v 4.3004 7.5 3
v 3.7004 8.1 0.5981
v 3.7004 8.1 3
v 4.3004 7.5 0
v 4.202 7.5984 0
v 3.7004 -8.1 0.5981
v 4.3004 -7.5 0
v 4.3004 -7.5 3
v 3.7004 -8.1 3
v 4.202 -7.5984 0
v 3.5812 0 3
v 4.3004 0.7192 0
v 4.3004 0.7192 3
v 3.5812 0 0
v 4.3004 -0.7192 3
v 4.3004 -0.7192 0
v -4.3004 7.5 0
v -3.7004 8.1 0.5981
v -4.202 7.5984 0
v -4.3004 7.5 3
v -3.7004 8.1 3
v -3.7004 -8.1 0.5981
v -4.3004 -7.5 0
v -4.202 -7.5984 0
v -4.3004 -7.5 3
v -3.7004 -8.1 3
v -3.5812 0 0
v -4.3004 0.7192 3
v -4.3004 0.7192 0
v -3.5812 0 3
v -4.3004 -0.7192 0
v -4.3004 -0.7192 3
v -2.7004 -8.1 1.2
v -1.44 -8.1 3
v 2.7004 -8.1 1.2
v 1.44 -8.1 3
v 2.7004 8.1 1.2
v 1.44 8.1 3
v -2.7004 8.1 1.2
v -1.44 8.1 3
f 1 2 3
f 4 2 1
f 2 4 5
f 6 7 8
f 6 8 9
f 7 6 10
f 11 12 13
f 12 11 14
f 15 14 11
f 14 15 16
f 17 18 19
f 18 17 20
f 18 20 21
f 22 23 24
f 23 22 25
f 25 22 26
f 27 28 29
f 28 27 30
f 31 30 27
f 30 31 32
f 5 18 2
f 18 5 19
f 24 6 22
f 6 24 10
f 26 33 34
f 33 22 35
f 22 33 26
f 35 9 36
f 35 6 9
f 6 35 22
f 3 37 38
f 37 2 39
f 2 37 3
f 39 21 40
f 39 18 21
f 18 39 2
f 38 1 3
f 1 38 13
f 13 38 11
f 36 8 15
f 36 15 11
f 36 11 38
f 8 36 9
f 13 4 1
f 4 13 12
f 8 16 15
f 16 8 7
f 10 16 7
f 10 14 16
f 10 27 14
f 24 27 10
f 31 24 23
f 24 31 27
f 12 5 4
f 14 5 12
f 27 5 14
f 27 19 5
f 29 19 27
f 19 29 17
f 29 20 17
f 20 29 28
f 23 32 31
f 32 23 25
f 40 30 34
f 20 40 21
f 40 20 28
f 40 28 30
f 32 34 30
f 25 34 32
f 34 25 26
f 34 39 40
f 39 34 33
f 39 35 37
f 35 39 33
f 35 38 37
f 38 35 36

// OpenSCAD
// file: elephant.scad
// An ELEPHANT HEAD on the puzzle key's top face (`face = "elephant"` in
// puzzle-key.scad, 2026-10-28). Seen from above, like a watch face: the
// face's "up" runs along the band (+x), the trunk hangs towards -x, the big
// ears spread across the band (y), where the key is long.
//
// Everything stands on the key's top (z = `pz_thick`) and is a HEIGHT
// FIELD: half-ellipsoid domes, and the trunk a hull of domes. The key
// prints upright, legs on the bed, so the face is its top and nothing hangs.
// It is clipped to the key's own outline (`ek_outline_2d`), so it never
// reaches over the band's ends, the notches or the chamfered ends, and the
// key slides in as before.
//
// Frame: the key's, fastened — x along the band from the key's middle, y
// across it, z up from the bed. Needs lib/puzzle-key.scad included first.

// ----------------------------------------------------------------- head
ek_head   = [0.5, 0, 3.4, 4.0, 2.8];   // [x, y, rx, ry, height]
// ----------------------------------------------------------------- ears
ek_ear    = [-0.2, 4.4, 3.9, 3.0, 1.5];   // the +y ear; -y mirrored
ek_inner  = 0.5;     // the inner ear's dimple, as a share of the ear
ek_in_d   = 0.3;     // ... its depth below the ear's top
ek_in_dy  = 0.5;     //   and how far it sits out from the ear's middle
// ----------------------------------------------------------------- trunk
// The trunk's path, root to curled tip: [x, y, radius, rise above the
// head]. Where the head is lower than the rise, the trunk stands on the
// key's top on its own.
ek_trunk  = [[ 1.2,  0.0,  1.45, 0.7 ],
             [ 0.0,  0.0,  1.35, 0.7 ],
             [-1.3,  0.05, 1.2,  0.7 ],
             [-2.5,  0.3,  1.05, 0.75],
             [-3.2,  1.0,  0.95, 1.3 ],
             [-3.0,  1.9,  0.8,  1.15],
             [-2.3,  2.1,  0.65, 0.95]];
// ----------------------------------------------------------------- eyes
ek_eye    = [2.2, 1.8];     // [x, |y|] — dimples in the head
ek_eye_r  = 0.55;
ek_eye_d  = 0.45;           // how deep

// The head's height above the key's top at (x, y).
function ek_head_h(x, y) =
    let(u = (x - ek_head[0]) / ek_head[2], v = (y - ek_head[1]) / ek_head[3],
        q = 1 - u*u - v*v)
    q > 0 ? ek_head[4] * sqrt(q) : 0;

// A half-ellipsoid standing on z = 0: plan radii rx, ry, height h.
module ek_dome(rx, ry, h)
    scale([rx, ry, h]) intersection() {
        sphere(r = 1, $fn = 48);
        translate([-1, -1, 0]) cube(2);
    }

// The key's top outline: inside its faces, off the notches, the lead-ins and
// the chamfered ends, `ek_inset` in from each.
ek_inset = 0.15;
module ek_outline_2d()
    offset(delta = -ek_inset) difference() {
        square([2*pz_so, pz_len - 2*pz_tch[0]], center = true);
        for (m = [0, 1]) mirror([m, 0]) {
            translate([pz_so, 0])
                polygon([[0.01, -pz_nd - 0.01], [0.01, pz_nd + 0.01], [-pz_nd, 0]]);
            for (e = [-1, 1]) translate([pz_so, e * pz_len/2])
                polygon([[0.01, e*0.01], [0.01, -e*(pz_ch + 0.01)], [-pz_ch - 0.01, e*0.01]]);
        }
    }

module ek_ears()
    for (m = [0, 1]) mirror([0, m, 0]) difference() {
        translate([ek_ear[0], ek_ear[1], 0]) ek_dome(ek_ear[2], ek_ear[3], ek_ear[4]);
        // the inner ear, a shallow dish
        translate([ek_ear[0], ek_ear[1] + ek_in_dy, ek_ear[4] - ek_in_d + 1])
            scale([ek_inner*ek_ear[2], ek_inner*ek_ear[3], 1]) sphere(r = 1, $fn = 48);
    }

module ek_trunk()
    for (i = [0 : len(ek_trunk) - 2]) hull()
        for (p = [ek_trunk[i], ek_trunk[i+1]])
            translate([p[0], p[1], 0])
                ek_dome(p[2], p[2], max(ek_head_h(p[0], p[1]), 0) + p[3]);

module ek_head()
    difference() {
        translate([ek_head[0], ek_head[1], 0]) ek_dome(ek_head[2], ek_head[3], ek_head[4]);
        for (s = [-1, 1])
            translate([ek_eye[0], s*ek_eye[1],
                       ek_head_h(ek_eye[0], ek_eye[1]) + ek_eye_r - ek_eye_d])
                sphere(r = ek_eye_r, $fn = 32);
    }

// The whole face, on the key's top.
module ek_face()
    translate([0, 0, pz_thick - 0.01]) intersection() {
        union() { ek_ears(); ek_head(); ek_trunk(); }
        translate([0, 0, -1]) linear_extrude(20) ek_outline_2d();
    }
// file: ../../lib/puzzle-key.scad
// The PUZZLE buckle's KEY (`buckle = "puzzle"` in bracelet.scad), shared by
// the bracelet (the grooves in its two ends) and `models/puzzle-key` (the key).
//
// From a photo of a three-piece puzzle clasp (2026-10-27): two end caps and a
// middle piece that slides over both SIDEWAYS, across the cord. Here the two
// band ends butt together, each with a GROOVE across the band cut from the
// top, and a separate KEY slides into both grooves from the band's edge:
//
//   section along the band, fastened (s from the seam's middle)
//
//                  ┌───────────── key ─────────────┐   top, flush
//      last bar  ┌─┘┌─────┐                 ┌─────┐└─┐  bar 0's block
//   ─────────────┤  │ leg  \  ridge │ ridge  / leg │  ├────────────────
//                │  │       \_____  │  _____/      │  │
//                └──┴─────────────┐ │ ┌────────────┴──┘
//   ──────────────── floor ───────┘ │ └──── floor ───────────── bed
//                                 seam
//
//   * Each end's RIDGE (between the seam and its groove) leans out over the
//     groove at `pz_a`: the groove is a dovetail, wider at the floor. The
//     key's LEGS fill them, so the key cannot lift out, and the band's pull
//     — each ridge pushing its leg away from the seam — wedges it DOWN onto
//     the floors. The key's top bridges the seam, flush with the band.
//   * Nothing in the band hangs: a ridge's lean is a `pz_a` overhang on the
//     floor. The key prints STANDING on one end, so its section is printed
//     as drawn.
//   * Across the band, the grooves are open at both edges: the key slides in
//     from either edge, and out by pushing its other end. It CLICKS home on a
//     spring leaf in bar 0's groove wall (in the bracelet): a bump on the
//     leaf drops into a V-notch in the middle of the key's outer faces.
//
// Why three parts: two ends printed flat cannot lock each other against the
// pull and also slide together sideways. One of them has to reach OVER the
// other, and that overhang would run the whole band's width anchored at one
// edge only. The key escapes it by printing standing.
//
// This file draws nothing — variables, functions and modules only. Everything
// is named `pz_*`.

pz_thick  = 4.2;     // the band's thickness (asserted == `thick`)
pz_len    = 16.2;    // the key across the band = the band's width (asserted)

pz_seam   = 0.15;    // each end's face from the seam's middle: 0.3 apart
pz_fit    = 0.15;    // across the key's faces: leg <-> ridge, leg <-> wall
pz_vfit   = 0.2;     // vertical: a leg's foot over the floor, a ridge's top
                     //   under the key's bridge
pz_floor  = 1.0;     // the band under the grooves: it carries the pull
pz_bridge = 1.2;     // the key's top, over the ridges and the seam
pz_ridge  = 1.0;     // a ridge at the floor, along the band
pz_a      = 35;      // the ridge's undercut face, from vertical
pz_leg    = 1.6;     // a leg at the bridge, along the band

pz_zk = pz_thick - pz_bridge;     // 3.0 — the bridge's underside
pz_zr = pz_zk - pz_vfit;          // 2.8 — the ridges' tops
pz_zl = pz_floor + pz_vfit;       // 1.2 — the legs' feet

// A ridge's face, d along the band from its end's face, at height z.
function pz_dr(z) = pz_ridge + (z - pz_floor) * tan(pz_a);
// The key's leg, s from the seam's middle: inner face at height z, outer face.
function pz_si(z) = pz_seam + pz_dr(z) + pz_fit;
pz_so = pz_si(pz_zk) + pz_leg;            // 4.30
pz_do = pz_so + pz_fit - pz_seam;         // 4.30 — the groove's outer wall, d

// --------------------------------------------------------------- the click
// A LEAF in bar 0's groove's outer wall, running ACROSS the band, rooted
// towards +y, its free tip just past the band's middle. It bends along the
// band, which for the flat-printed band is in its layers' plane. Its
// bump stands `pz_click` into the key's path; the key's outer face has a
// V-notch at its middle that the bump drops into, free.
pz_click  = 0.4;     // how far the leaf bends while the key slides past
pz_lt     = 1.0;     // the leaf, along the band
pz_slot   = 0.65;    // behind it: room to bend `pz_click`, and 0.25 more
pz_ll     = 6.5;     // root -> bump, across the band
pz_tipx   = 1.0;     // the leaf's free tip, past the bump
pz_gap    = 0.6;     // the slot's mouth into the groove, at the tip
pz_br     = 0.6;     // the bump's radius
pz_ch     = 0.6;     // the key's ends: lead-in chamfers on the outer faces
pz_tch    = [0.5, 0.6];   // ... and the top edge, as the band's (run, rise)

// The bump's centre, d from the end's face (y = 0 at the band's middle).
pz_bd = pz_do - (pz_fit + pz_click) + pz_br;
// The notch: 45° flanks, deep enough that the seated bump clears both by 0.05.
pz_nd = sqrt(2) * (pz_br + 0.05) - (pz_br - pz_click);
pz_dmax = pz_do + pz_lt + pz_slot;        // the deepest cut, d
pz_strain = 1.5 * pz_lt * pz_click / (pz_ll * pz_ll) * 100;

// ---------------------------------------------------------------- sections
// The key's section, (s, z).
module pz_key_2d()
    for (m = [0, 1]) mirror([m, 0])
        polygon([[-0.01, pz_zk], [pz_si(pz_zk), pz_zk], [pz_si(pz_zl), pz_zl],
                 [pz_so, pz_zl], [pz_so, pz_thick], [-0.01, pz_thick]]);

// What one end loses, (d, z), d from its face into the end: the recess over
// the ridge (the key's bridge) and the dovetail groove.
module pz_cut_2d()
    polygon([[-1, pz_zr], [pz_dr(pz_zr), pz_zr], [pz_dr(pz_floor), pz_floor],
             [pz_do, pz_floor], [pz_do, pz_thick + 1], [-1, pz_thick + 1]]);

// The key, fastened: s along x from the seam's middle, y across the band
// from its middle, z up from the bed.
module pz_key()
    difference() {
        translate([0, pz_len/2, 0]) rotate([90, 0, 0])
            linear_extrude(pz_len) pz_key_2d();
        for (m = [0, 1]) mirror([m, 0, 0]) {
            // the V-notch the bump drops into
            translate([pz_so, 0, -1]) linear_extrude(pz_thick + 2)
                polygon([[0.01, -pz_nd - 0.01], [0.01, pz_nd + 0.01], [-pz_nd, 0]]);
            // lead-in chamfers at both ends of the outer face
            for (e = [-1, 1]) translate([pz_so, e * pz_len/2, -1])
                linear_extrude(pz_thick + 2)
                    polygon([[0.01, e*0.01], [0.01, -e*(pz_ch + 0.01)],
                             [-pz_ch - 0.01, e*0.01]]);
        }
        // the top edge at both ends, chamfered as the band's
        for (e = [-1, 1]) translate([0, e * pz_len/2, pz_thick])
            rotate([90, 0, 90]) linear_extrude(2*pz_so + 2, center = true)
                polygon([[e*0.01, 0.01], [-e*(pz_tch[0] + 0.01), 0.01],
                         [e*0.01, -(pz_tch[1] + 0.01)]]);
    }
// main file
// The puzzle buckle's key, for `buckle = "puzzle"` in models/bracelet.
// Prints LYING, top face down on the bed, legs up (the user's choice,
// 2026-10-27; it was first drawn standing). The legs' undercut inner
// faces are then 35° overhangs. Everything it is made of lives in
// lib/puzzle-key.scad, which the bracelet shares for the grooves.
//
// FACES (2026-10-28): `face` decorates the key's top. The key underneath is
// always the same, so every face fits the same band. A decorated key prints
// UPRIGHT, as it sits in the band: legs on the bed, the face on top; its
// top bridges the 5.4 between the legs.
//   "plain"    — flat, printed top down as before
//   "elephant" — an elephant head (elephant.scad)
include <../../lib/puzzle-key.scad>
include <elephant.scad>

$fn = 48;

face = "plain";
assert(face == "plain" || face == "elephant", str("unknown face ", face));

assert(pz_nd < pz_leg, "the notch cuts through the leg");
assert(pz_a <= 40, "the legs' inner faces would hang past 40 deg, printed top down");

if (face == "plain")
    translate([0, 0, pz_thick]) rotate([180, 0, 0]) pz_key();
else
    // upright, the legs' feet on the bed
    translate([0, 0, -pz_zl]) {
        pz_key();
        if (face == "elephant") ek_face();
    }
